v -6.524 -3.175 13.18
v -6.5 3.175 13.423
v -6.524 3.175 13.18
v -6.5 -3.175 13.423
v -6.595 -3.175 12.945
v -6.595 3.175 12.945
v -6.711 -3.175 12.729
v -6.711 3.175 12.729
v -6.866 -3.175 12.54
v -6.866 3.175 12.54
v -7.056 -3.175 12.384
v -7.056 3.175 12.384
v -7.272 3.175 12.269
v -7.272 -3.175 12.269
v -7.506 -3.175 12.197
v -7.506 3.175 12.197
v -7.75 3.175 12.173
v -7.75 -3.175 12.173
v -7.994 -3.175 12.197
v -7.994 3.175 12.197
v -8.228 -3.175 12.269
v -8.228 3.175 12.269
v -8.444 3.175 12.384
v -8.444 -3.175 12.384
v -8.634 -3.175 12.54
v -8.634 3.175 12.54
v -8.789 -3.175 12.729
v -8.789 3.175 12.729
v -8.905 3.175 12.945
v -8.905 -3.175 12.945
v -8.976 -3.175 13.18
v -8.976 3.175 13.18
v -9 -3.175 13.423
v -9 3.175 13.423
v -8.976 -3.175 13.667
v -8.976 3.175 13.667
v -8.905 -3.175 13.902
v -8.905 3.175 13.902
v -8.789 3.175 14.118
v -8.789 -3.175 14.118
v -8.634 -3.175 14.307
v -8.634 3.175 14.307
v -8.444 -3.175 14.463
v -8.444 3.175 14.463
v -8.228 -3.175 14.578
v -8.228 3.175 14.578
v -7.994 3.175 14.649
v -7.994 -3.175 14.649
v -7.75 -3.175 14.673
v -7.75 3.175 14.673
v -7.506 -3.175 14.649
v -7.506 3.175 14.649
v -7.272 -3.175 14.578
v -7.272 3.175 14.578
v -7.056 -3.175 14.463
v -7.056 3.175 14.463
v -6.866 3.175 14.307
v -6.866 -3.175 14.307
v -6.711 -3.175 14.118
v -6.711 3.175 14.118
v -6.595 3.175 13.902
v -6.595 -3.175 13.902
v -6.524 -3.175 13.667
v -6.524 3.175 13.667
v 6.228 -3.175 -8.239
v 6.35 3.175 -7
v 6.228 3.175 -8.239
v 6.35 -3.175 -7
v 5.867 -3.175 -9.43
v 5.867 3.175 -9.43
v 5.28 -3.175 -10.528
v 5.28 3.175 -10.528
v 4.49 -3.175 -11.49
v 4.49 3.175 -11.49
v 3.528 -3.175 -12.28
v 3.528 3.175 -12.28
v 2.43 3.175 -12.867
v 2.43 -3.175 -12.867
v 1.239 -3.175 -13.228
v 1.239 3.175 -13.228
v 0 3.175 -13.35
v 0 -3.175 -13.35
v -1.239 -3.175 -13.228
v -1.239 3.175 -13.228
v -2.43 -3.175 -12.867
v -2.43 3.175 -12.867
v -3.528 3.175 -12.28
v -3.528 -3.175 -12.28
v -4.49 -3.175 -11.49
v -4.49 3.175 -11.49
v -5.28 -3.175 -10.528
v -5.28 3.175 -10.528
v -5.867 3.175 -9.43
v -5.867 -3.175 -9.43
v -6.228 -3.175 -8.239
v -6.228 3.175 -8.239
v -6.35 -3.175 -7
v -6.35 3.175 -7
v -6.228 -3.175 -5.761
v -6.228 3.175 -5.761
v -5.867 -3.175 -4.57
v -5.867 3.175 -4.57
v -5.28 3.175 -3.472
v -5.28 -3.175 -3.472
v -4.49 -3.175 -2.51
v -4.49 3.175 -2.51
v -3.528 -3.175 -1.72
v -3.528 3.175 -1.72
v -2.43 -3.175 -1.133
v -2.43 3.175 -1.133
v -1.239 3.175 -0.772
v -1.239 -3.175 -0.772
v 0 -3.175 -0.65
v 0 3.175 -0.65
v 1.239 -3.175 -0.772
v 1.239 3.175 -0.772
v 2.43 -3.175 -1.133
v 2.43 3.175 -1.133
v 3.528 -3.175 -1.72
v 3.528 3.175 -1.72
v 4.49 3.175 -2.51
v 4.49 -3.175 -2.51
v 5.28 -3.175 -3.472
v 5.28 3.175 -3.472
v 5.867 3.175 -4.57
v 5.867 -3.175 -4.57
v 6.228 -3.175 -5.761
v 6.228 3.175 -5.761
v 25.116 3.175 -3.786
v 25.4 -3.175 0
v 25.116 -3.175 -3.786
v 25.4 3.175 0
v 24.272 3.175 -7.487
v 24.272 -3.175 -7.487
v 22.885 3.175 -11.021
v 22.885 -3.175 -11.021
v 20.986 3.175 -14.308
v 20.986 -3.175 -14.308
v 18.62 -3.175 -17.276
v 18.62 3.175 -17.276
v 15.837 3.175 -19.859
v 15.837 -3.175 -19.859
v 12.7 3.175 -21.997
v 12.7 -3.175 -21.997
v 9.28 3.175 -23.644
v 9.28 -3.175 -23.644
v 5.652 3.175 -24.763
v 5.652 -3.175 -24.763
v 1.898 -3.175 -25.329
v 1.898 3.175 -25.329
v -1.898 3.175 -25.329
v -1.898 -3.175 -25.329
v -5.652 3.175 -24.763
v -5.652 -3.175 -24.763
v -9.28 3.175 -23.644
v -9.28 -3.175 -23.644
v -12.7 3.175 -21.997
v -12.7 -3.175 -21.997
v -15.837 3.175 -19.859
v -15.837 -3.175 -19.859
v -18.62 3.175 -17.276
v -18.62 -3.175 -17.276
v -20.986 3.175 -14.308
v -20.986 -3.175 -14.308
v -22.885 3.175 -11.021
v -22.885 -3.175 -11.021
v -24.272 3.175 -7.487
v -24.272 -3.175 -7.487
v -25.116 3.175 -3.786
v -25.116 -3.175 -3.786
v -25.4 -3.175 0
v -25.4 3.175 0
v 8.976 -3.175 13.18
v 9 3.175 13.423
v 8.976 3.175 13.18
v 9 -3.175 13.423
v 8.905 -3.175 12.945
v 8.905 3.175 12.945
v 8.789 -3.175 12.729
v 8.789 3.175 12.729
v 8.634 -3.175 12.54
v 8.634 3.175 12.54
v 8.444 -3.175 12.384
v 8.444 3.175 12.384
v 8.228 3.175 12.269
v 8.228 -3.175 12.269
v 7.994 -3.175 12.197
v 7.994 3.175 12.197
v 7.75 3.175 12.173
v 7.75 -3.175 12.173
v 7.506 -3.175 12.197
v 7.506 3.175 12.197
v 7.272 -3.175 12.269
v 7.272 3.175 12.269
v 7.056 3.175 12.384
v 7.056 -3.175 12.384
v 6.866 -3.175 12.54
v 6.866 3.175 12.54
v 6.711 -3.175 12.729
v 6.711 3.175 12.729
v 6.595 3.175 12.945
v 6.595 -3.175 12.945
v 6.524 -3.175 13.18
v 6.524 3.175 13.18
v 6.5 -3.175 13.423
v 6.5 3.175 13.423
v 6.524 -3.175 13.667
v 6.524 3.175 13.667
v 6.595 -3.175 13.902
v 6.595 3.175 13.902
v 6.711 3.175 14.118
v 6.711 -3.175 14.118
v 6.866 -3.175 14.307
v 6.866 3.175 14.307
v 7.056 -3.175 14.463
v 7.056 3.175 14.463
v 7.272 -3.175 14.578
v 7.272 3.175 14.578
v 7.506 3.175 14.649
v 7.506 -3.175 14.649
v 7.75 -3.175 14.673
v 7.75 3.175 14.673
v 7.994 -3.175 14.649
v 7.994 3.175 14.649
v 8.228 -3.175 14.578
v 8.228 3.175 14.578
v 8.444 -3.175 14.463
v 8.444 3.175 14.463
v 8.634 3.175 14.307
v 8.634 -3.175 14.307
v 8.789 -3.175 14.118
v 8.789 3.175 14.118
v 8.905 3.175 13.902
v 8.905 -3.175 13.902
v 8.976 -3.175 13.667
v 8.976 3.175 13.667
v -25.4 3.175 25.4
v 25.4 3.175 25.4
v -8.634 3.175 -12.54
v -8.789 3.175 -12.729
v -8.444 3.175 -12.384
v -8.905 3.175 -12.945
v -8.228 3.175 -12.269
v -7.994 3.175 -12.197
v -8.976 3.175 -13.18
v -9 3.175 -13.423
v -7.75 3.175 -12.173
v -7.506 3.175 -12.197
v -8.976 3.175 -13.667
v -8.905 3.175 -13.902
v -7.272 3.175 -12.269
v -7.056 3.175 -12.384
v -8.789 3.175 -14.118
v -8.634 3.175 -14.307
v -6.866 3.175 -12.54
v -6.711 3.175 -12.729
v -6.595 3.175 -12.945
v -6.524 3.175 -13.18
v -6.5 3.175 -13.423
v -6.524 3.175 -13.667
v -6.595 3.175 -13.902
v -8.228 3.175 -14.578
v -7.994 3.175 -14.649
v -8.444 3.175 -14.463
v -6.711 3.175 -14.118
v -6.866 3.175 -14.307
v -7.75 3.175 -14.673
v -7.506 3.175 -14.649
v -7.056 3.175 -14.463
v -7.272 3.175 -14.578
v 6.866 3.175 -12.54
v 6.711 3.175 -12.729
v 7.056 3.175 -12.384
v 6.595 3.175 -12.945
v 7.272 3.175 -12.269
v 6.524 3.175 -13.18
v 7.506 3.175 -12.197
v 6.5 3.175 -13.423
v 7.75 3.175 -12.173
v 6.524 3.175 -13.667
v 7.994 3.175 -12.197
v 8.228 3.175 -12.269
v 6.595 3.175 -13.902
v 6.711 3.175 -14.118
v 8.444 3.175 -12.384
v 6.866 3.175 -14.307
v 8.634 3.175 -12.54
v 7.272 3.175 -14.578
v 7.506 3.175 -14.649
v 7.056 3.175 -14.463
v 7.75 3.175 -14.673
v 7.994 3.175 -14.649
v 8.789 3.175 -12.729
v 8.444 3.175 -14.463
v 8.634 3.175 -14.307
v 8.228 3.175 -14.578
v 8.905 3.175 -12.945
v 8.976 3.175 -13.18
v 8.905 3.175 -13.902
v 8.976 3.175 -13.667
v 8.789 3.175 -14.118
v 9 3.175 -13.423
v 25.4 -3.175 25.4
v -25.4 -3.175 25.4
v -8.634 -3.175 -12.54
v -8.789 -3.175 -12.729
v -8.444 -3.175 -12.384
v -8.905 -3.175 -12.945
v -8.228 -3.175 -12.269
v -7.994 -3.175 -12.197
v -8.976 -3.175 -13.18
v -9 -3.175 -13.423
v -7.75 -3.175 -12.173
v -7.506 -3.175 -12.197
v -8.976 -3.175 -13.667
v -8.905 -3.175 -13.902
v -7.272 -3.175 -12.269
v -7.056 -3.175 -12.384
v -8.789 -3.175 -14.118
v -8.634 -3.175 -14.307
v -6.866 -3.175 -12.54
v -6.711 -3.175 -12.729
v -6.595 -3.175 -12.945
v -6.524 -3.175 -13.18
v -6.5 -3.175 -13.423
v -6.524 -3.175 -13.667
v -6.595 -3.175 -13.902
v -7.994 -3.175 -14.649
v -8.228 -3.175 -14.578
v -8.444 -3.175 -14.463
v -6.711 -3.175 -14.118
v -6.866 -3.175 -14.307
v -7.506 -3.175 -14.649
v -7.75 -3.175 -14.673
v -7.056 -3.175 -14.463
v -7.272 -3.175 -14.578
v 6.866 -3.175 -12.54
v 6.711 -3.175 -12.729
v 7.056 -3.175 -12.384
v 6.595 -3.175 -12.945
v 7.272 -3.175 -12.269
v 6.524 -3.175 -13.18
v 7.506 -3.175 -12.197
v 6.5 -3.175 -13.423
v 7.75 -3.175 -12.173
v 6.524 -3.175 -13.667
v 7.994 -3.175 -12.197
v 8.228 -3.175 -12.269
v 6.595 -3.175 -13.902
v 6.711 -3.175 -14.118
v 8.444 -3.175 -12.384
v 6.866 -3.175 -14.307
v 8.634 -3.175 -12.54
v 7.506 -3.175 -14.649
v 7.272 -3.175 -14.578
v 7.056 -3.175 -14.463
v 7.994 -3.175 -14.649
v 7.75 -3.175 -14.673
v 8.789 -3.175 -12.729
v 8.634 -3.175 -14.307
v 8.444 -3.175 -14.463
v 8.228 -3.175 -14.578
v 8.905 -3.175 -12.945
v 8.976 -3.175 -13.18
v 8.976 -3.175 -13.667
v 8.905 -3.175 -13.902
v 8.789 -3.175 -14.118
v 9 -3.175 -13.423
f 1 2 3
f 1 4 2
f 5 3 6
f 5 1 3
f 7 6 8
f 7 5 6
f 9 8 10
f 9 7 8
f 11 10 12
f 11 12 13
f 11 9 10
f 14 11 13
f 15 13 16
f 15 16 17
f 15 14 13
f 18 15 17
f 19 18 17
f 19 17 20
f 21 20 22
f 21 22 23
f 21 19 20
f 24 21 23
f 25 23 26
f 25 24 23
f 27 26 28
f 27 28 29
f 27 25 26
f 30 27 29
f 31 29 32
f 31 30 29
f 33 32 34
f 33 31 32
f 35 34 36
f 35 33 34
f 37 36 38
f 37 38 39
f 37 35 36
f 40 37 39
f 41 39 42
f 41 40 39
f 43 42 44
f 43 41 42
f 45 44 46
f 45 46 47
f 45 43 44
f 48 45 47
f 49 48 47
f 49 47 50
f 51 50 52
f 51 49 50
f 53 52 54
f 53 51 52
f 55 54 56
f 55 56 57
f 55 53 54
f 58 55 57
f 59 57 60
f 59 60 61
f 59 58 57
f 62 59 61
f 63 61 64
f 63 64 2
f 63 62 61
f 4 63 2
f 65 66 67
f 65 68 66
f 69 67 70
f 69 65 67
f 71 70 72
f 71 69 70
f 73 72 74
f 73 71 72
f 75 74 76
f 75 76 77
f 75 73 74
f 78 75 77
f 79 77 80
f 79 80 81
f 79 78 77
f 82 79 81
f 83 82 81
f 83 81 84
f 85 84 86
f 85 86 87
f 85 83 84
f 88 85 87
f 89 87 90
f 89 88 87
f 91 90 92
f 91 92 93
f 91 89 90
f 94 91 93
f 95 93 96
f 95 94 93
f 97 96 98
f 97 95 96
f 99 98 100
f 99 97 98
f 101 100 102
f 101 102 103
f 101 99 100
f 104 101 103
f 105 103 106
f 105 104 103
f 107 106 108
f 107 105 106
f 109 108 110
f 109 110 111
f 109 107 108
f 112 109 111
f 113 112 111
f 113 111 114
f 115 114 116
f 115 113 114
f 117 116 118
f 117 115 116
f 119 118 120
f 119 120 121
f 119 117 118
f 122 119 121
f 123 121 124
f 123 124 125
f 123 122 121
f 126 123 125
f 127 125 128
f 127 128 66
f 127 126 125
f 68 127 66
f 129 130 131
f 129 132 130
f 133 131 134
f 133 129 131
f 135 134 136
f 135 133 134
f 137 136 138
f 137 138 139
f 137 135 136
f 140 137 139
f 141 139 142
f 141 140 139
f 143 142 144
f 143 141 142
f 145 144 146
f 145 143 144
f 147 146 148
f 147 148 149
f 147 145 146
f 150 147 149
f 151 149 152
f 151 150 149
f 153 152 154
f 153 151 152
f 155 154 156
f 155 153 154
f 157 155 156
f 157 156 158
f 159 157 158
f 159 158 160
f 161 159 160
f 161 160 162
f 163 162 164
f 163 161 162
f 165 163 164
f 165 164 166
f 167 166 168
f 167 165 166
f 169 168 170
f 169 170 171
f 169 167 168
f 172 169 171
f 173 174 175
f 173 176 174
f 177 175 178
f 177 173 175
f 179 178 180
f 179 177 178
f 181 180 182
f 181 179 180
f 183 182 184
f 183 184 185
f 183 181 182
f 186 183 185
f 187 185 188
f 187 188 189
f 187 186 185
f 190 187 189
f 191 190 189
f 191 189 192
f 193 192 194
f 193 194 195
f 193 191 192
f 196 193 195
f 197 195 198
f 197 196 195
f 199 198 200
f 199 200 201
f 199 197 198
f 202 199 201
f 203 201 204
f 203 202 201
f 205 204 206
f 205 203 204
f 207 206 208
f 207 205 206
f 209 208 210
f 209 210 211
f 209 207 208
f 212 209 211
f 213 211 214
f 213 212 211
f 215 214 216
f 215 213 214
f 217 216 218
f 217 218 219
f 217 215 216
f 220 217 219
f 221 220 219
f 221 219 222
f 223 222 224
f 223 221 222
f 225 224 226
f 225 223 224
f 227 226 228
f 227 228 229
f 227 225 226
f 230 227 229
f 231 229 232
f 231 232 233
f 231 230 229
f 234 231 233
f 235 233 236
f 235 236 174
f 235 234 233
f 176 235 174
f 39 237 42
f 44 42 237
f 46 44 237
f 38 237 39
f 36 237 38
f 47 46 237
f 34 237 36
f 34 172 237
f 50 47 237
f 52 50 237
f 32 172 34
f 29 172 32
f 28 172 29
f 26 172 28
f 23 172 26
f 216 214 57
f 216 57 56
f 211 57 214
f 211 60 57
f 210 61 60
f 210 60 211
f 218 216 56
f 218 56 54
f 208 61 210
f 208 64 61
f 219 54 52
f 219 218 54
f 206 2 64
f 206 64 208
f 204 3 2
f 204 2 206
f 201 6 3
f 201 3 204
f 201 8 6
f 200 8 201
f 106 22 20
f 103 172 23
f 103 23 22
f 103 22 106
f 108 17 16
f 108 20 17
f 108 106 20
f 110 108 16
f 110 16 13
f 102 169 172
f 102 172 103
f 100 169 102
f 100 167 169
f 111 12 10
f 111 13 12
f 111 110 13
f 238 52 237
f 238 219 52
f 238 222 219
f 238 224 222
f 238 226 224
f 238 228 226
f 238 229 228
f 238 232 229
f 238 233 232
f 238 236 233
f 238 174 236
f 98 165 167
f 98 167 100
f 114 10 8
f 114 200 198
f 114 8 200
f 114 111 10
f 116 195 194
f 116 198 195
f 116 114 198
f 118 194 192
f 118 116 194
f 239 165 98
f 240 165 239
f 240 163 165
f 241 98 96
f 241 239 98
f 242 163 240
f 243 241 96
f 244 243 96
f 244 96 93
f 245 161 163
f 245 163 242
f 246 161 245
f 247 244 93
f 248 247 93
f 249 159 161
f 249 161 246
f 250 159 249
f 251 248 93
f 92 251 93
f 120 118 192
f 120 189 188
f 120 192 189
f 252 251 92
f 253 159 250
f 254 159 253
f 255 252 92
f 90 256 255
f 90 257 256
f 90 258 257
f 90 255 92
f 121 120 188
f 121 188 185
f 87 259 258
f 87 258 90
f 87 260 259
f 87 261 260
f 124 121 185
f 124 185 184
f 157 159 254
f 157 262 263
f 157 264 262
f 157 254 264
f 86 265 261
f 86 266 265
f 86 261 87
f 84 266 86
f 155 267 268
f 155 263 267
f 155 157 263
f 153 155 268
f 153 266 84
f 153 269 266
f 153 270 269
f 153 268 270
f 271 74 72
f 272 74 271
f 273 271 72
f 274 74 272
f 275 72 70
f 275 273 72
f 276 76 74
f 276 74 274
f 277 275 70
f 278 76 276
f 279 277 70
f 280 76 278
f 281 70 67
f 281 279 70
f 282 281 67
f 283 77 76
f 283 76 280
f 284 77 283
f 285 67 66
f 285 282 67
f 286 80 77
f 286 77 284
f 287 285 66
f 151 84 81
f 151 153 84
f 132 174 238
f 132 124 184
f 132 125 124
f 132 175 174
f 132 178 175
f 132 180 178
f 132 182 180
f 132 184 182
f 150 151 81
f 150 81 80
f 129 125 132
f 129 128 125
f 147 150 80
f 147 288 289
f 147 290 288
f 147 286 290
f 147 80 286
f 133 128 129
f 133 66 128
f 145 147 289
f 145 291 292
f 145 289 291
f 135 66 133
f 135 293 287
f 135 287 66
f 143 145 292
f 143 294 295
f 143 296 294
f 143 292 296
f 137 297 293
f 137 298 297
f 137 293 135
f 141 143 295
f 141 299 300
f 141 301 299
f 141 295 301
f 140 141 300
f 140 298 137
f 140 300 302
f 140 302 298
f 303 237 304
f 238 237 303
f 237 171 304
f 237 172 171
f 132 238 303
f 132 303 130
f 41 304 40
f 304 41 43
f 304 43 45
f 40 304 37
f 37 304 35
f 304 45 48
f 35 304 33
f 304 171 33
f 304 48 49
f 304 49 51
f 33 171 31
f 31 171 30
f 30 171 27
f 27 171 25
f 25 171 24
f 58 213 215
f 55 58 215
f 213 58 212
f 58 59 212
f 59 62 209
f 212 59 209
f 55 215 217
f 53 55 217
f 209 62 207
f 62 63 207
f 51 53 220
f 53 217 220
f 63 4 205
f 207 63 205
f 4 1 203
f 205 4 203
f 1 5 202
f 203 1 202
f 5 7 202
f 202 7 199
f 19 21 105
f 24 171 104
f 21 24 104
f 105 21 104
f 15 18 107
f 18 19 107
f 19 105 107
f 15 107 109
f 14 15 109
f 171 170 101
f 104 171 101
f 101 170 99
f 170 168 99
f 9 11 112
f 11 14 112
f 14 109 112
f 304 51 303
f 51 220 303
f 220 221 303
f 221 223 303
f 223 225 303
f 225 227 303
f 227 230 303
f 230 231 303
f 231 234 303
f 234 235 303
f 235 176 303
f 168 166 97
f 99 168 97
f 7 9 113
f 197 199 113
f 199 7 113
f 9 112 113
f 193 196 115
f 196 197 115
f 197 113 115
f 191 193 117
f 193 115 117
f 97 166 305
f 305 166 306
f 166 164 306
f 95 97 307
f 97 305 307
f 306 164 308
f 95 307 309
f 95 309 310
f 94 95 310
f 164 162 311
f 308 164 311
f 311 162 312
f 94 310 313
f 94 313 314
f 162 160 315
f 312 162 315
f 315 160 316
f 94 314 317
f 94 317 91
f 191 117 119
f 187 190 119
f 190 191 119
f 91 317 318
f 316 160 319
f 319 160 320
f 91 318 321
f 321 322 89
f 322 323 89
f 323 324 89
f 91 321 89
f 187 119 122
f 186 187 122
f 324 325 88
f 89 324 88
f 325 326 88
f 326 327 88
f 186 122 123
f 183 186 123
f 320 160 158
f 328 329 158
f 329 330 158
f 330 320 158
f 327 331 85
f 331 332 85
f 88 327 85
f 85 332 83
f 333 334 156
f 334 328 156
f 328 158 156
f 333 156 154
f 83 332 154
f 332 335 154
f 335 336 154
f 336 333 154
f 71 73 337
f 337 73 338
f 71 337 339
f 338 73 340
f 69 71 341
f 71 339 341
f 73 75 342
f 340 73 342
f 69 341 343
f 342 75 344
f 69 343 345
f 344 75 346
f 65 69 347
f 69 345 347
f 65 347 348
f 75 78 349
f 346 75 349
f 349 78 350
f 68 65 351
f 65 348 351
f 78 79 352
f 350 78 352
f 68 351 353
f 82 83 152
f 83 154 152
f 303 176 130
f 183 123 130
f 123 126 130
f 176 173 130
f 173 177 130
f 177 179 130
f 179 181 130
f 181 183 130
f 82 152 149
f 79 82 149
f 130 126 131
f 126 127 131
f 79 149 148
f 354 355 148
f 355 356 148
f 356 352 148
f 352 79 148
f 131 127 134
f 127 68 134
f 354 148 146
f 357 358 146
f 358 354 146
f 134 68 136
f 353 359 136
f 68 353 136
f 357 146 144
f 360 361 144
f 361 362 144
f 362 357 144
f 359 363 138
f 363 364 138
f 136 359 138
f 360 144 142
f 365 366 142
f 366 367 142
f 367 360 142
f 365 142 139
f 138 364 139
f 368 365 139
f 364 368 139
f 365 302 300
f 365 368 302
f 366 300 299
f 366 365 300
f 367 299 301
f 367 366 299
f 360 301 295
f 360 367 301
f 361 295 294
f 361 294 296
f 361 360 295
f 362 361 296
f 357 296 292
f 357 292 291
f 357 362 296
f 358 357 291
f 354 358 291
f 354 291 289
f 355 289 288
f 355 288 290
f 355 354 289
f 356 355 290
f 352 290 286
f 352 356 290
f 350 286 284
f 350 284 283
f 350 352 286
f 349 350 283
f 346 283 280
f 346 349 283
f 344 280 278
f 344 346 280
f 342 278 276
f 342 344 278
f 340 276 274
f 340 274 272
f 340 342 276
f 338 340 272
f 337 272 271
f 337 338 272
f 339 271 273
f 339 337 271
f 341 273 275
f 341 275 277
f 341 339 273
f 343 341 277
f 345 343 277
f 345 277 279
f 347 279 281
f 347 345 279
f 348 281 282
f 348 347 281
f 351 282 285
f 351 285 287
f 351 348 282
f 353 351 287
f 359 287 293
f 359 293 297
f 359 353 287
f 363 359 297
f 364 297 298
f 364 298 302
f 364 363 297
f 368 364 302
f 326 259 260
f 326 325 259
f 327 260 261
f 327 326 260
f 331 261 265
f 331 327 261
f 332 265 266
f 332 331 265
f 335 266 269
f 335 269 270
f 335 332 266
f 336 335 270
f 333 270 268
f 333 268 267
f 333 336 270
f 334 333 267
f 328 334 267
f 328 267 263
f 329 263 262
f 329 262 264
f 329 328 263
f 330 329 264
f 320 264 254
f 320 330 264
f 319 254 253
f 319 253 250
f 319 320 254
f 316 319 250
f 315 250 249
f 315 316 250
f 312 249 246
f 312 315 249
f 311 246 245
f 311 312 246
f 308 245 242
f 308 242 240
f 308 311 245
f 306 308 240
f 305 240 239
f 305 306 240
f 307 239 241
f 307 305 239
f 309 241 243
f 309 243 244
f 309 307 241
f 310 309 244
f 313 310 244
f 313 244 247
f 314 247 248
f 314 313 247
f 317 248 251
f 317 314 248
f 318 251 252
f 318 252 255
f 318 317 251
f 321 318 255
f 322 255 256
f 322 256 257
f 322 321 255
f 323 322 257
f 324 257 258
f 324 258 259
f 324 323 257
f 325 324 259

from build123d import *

# Parameters (mm, degrees)
SKETCH3_R           = 6.35
SKETCH3_R_2         = 1.25
BOSS_EXTRUDE4_DEPTH = 3.175


with BuildPart() as part:
    # Sketch3 → Boss-Extrude4 (new body, symmetric)
    with BuildSketch(Plane(origin=(0, 0, 0), x_dir=(1, 0, 0), z_dir=(0, 1, 0))):
        with BuildLine():
            Line((-25.4, 0), (-25.4, -25.4))
            Line((-25.4, -25.4), (0, -25.4))
            Line((0, -25.4), (25.4, -25.4))
            Line((25.4, -25.4), (25.4, 0))
            ThreePointArc((25.4, 0), (0, 25.4), (-25.4, 0))
        make_face()
        with Locations((1e-09, 7)):
            Circle(SKETCH3_R, mode=Mode.SUBTRACT)
        with Locations((7.75, 13.423393759)):
            Circle(SKETCH3_R_2, mode=Mode.SUBTRACT)
        with Locations((-7.75, 13.423393759)):
            Circle(SKETCH3_R_2, mode=Mode.SUBTRACT)
        with Locations((-7.75, -13.423393759)):
            Circle(SKETCH3_R_2, mode=Mode.SUBTRACT)
        with Locations((7.75, -13.423393759)):
            Circle(SKETCH3_R_2, mode=Mode.SUBTRACT)
    extrude(amount=BOSS_EXTRUDE4_DEPTH, both=True)


solid = part.part
